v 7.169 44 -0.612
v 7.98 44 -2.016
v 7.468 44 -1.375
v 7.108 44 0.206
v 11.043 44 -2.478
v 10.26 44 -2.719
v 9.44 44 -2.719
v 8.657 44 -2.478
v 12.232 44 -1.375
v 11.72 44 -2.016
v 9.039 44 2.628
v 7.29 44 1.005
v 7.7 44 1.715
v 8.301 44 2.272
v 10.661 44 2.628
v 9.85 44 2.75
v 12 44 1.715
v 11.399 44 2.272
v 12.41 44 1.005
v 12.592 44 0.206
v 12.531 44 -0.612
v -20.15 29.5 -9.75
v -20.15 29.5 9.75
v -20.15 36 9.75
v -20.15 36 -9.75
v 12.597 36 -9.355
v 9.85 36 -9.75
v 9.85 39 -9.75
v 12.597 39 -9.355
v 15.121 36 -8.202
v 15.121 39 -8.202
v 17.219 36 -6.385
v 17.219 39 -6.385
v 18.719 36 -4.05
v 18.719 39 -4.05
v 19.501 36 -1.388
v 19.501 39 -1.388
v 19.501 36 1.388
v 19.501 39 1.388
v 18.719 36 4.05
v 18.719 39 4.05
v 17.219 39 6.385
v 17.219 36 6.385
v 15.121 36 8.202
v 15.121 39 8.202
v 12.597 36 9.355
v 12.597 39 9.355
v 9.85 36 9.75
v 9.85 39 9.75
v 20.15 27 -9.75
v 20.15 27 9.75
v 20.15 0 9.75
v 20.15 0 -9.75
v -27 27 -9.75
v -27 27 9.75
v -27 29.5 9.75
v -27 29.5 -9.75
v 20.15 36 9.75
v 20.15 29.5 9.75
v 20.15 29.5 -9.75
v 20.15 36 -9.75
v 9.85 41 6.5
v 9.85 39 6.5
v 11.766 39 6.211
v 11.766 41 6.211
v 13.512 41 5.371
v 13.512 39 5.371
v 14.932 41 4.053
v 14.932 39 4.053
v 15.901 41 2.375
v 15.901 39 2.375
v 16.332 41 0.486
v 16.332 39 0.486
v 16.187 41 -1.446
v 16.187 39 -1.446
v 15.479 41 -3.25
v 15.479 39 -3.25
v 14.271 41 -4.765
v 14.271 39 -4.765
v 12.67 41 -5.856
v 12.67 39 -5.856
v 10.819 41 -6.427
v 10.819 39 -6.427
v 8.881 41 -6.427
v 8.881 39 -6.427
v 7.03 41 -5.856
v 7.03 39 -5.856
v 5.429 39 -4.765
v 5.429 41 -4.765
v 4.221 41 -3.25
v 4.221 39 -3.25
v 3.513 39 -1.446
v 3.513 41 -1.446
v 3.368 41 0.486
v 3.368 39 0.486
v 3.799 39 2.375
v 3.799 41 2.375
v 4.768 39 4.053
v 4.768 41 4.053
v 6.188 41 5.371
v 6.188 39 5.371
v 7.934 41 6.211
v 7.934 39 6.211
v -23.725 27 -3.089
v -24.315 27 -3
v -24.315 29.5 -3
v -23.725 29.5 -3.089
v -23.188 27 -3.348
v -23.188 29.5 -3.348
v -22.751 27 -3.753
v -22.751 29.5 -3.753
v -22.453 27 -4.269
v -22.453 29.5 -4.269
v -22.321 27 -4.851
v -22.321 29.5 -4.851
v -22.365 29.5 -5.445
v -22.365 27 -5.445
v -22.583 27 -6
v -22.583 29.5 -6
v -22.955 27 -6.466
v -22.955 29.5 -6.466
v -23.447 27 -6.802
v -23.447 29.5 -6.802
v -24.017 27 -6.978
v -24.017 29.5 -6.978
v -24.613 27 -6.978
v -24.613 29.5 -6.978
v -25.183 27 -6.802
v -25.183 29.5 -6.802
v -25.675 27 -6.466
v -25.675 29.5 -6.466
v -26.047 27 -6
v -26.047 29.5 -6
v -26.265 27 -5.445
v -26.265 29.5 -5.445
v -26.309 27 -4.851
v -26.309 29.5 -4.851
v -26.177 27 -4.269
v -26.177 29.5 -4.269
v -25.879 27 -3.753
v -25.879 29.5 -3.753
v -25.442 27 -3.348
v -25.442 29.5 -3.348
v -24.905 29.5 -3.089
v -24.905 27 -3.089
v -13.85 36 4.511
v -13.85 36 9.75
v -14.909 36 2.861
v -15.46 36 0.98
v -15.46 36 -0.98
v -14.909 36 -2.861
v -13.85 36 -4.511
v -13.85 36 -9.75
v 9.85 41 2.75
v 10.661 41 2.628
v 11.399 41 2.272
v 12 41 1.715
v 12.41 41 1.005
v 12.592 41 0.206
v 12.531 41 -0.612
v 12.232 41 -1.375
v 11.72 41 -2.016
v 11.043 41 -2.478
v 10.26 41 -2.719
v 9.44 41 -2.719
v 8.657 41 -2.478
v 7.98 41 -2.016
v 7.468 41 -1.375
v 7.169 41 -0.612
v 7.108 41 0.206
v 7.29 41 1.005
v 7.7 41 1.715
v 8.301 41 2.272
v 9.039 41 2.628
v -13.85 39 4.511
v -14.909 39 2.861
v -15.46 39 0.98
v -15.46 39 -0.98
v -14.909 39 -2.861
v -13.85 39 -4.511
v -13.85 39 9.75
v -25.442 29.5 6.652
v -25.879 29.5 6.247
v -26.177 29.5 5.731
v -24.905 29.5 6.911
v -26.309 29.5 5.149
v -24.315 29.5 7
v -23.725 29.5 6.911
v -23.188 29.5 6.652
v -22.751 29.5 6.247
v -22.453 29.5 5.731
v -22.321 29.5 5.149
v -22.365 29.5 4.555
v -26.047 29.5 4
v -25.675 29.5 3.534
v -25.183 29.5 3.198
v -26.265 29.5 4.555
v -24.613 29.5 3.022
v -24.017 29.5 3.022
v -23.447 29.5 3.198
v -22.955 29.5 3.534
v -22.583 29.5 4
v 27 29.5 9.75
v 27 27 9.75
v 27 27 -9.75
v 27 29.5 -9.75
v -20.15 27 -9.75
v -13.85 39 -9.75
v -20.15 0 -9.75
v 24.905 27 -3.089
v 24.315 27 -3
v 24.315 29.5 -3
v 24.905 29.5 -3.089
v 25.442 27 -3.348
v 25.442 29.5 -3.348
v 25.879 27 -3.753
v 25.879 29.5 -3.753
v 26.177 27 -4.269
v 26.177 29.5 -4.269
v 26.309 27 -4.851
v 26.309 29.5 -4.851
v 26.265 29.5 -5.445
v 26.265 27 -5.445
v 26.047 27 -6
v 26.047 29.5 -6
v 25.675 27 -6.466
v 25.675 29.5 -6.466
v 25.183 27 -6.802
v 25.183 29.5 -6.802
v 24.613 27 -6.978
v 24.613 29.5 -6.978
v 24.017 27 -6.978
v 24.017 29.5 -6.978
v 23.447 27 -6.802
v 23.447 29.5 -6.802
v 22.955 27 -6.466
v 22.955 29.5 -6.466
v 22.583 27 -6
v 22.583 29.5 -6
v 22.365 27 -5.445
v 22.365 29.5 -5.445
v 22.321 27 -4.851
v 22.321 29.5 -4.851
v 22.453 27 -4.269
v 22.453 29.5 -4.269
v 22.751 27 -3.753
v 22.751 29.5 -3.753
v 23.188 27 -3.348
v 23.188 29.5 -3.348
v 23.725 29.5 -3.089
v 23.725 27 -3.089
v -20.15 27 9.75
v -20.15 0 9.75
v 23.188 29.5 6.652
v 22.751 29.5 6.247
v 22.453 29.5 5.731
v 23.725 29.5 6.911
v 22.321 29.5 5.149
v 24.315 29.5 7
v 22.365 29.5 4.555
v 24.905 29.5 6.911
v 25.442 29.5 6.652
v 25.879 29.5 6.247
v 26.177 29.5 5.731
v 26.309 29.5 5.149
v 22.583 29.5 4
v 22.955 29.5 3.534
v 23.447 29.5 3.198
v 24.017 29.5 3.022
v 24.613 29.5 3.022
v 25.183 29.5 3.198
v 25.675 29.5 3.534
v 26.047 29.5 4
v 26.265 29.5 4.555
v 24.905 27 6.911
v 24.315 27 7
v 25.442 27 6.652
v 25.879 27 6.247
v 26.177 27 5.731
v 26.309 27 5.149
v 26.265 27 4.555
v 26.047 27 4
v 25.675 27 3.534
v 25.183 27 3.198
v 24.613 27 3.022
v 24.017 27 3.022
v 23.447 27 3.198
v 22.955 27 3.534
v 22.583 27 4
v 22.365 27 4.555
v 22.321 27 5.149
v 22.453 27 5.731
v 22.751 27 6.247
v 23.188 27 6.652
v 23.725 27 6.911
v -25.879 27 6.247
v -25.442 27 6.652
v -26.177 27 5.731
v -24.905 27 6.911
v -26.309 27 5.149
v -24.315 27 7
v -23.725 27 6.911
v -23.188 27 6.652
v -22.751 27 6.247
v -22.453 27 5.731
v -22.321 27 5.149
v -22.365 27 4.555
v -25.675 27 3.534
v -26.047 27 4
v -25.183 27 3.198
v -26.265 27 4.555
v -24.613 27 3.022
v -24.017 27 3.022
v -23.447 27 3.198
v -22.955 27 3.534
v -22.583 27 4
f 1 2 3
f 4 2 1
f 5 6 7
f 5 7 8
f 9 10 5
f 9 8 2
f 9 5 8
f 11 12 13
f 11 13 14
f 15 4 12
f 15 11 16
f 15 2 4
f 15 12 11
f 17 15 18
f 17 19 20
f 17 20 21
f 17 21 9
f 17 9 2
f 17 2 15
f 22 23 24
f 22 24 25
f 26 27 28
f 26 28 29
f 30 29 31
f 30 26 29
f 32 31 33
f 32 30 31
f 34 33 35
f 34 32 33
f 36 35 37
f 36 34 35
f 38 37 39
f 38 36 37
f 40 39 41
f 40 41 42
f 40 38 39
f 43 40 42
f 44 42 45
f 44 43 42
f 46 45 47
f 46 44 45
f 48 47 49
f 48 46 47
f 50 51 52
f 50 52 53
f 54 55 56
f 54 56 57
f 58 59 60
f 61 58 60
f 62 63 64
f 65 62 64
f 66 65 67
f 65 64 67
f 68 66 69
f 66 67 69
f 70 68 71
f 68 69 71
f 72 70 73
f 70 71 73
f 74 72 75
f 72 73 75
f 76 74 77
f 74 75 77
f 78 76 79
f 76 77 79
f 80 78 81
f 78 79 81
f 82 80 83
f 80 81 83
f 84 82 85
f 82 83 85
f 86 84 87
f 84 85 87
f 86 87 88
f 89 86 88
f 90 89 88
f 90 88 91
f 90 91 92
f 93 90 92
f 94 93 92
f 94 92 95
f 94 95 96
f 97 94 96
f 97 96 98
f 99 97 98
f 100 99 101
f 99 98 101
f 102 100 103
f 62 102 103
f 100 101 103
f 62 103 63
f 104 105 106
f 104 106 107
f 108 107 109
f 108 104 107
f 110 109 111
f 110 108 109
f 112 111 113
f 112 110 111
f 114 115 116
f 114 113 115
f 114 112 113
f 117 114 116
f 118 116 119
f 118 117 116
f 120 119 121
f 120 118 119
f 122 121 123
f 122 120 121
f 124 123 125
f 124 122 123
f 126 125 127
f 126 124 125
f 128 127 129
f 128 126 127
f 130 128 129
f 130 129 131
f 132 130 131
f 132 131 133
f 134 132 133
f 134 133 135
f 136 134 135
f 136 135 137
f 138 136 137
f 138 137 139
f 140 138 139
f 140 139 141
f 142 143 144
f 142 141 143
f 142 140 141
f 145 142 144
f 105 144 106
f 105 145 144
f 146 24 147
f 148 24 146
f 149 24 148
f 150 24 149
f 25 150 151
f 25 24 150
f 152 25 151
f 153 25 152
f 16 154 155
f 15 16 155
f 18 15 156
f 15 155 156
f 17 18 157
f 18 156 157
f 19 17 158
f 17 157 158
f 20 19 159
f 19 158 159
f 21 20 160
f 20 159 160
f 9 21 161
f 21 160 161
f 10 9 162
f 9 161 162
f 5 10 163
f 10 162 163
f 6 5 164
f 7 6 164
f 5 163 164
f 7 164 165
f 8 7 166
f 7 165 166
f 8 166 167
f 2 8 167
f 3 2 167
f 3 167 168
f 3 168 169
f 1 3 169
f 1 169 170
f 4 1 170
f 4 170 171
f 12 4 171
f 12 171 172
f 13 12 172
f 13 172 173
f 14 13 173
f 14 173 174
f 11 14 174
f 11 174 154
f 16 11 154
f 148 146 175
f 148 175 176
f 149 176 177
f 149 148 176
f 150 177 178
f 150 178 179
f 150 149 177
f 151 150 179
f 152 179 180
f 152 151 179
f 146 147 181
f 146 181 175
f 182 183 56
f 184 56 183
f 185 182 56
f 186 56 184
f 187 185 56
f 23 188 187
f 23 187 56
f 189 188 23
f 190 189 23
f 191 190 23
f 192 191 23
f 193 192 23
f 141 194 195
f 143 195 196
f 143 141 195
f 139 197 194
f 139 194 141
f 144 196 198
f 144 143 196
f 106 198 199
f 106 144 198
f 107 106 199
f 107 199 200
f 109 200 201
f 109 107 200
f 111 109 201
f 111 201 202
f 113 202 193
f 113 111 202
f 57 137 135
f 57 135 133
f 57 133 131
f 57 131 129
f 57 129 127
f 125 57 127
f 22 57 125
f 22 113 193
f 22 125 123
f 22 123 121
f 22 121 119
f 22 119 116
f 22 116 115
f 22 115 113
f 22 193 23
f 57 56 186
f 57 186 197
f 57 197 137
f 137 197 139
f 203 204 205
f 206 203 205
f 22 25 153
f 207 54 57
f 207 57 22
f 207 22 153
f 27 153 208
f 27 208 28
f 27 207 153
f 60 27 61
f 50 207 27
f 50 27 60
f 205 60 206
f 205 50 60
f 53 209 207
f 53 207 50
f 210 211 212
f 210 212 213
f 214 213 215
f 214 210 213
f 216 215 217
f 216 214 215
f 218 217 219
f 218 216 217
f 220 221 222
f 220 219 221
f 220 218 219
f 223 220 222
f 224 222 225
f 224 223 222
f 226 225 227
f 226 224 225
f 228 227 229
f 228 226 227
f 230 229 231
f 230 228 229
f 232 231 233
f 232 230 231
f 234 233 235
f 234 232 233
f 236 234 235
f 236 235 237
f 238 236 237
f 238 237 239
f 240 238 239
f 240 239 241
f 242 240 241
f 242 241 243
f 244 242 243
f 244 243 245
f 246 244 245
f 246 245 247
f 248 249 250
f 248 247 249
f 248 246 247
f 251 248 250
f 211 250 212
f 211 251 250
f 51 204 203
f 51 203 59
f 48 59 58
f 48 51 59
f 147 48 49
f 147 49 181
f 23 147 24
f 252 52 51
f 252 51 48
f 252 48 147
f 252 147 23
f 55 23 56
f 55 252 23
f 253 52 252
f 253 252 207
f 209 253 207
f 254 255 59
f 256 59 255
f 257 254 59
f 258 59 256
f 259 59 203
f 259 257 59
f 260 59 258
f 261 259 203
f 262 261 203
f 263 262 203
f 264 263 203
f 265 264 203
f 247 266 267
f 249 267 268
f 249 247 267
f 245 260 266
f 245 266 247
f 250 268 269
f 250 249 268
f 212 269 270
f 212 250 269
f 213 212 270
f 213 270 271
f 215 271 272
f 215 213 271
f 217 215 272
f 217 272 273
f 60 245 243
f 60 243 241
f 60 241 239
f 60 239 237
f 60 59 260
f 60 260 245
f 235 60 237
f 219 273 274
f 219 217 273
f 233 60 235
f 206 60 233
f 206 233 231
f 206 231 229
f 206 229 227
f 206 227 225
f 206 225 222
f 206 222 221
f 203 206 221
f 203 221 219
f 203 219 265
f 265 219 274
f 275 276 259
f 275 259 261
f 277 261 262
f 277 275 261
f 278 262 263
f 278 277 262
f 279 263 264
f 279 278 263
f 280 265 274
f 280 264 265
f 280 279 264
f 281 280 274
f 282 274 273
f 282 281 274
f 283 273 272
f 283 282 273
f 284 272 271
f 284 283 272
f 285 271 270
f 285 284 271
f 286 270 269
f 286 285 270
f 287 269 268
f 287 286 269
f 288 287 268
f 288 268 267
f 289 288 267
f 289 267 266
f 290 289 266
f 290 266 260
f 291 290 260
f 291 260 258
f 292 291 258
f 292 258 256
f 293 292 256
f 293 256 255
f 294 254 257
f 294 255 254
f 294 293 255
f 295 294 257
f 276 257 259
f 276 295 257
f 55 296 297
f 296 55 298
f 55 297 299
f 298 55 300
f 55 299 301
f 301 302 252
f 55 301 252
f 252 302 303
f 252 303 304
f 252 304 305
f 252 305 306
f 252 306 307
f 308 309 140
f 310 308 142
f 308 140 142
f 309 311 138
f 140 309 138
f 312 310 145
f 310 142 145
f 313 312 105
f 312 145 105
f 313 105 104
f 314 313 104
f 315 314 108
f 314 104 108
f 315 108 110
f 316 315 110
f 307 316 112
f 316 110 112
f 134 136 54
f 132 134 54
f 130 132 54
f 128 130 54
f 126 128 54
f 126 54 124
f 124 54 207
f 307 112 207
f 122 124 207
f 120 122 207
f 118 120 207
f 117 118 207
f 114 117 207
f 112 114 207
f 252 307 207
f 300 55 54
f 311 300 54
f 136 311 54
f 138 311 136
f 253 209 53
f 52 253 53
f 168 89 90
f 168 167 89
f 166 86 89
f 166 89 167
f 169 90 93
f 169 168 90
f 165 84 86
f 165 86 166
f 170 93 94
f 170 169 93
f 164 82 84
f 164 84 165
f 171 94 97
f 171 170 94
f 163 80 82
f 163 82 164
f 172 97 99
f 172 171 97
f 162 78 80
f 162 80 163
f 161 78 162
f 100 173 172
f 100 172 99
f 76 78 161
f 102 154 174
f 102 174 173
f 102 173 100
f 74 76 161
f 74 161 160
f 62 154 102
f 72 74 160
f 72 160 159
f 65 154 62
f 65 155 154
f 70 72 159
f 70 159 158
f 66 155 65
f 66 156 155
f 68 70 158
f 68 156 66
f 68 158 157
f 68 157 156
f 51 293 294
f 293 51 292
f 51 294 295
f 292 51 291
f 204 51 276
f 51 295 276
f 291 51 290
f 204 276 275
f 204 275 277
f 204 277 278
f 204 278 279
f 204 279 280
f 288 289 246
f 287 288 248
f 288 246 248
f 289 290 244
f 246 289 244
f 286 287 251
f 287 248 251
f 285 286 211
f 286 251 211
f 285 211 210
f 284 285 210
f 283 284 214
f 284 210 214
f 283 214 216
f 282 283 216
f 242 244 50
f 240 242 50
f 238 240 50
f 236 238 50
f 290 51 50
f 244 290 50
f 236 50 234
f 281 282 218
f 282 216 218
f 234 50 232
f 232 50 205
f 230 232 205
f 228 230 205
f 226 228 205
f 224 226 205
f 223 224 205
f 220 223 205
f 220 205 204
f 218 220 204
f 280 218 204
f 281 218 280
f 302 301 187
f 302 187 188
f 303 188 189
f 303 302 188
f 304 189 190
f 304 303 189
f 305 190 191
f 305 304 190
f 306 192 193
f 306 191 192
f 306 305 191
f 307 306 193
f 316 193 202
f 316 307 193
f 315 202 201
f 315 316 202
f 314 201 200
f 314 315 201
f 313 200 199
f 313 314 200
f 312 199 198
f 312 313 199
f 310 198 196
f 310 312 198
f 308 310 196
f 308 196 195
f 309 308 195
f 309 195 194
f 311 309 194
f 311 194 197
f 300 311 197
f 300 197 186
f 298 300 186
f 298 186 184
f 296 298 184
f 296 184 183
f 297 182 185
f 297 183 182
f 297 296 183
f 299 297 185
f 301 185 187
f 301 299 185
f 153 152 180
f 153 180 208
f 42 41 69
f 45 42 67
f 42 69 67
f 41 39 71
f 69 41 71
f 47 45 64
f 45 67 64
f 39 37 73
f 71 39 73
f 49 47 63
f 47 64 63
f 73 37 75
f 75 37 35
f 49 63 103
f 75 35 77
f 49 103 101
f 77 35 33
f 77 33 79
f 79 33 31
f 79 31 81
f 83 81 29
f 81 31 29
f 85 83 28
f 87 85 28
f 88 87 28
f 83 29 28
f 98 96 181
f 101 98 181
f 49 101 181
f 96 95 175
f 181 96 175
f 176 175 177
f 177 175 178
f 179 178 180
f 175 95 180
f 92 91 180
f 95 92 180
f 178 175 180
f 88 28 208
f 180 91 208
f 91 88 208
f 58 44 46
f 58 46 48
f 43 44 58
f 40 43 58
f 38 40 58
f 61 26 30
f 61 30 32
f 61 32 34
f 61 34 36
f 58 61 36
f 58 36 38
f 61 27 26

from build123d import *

# Parameters (mm, degrees)
SKETCH1_W               = 40.3
SKETCH1_H               = 19.5
BOSS_EXTRUDE1_DEPTH     = 27
SKETCH2_W               = 54
SKETCH2_H               = 19.5
BOSS_EXTRUDE2_DEPTH     = 2.5
SKETCH3_W               = 40.3
SKETCH3_H               = 19.5
BOSS_EXTRUDE3_DEPTH     = 6.5
SKETCH4_R               = 2.75
BOSS_EXTRUDE4_DEPTH     = 8
CUT_EXTRUDE1_DEPTH      = 42.162027404
CUT_EXTRUDE1_DEPTH_BACK = 42.162027404
SKETCH5_R               = 2
BOSS_EXTRUDE5_DEPTH     = 3
SKETCH7_R               = 6.5
BOSS_EXTRUDE6_DEPTH     = 2
BOSS_EXTRUDE7_DEPTH     = 3


with BuildPart() as part:
    # Sketch1 → Boss-Extrude1 (new body)
    with BuildSketch(Plane(origin=(0, 0, 0), x_dir=(1, 0, 0), z_dir=(0, 1, 0))):
        Rectangle(SKETCH1_W, SKETCH1_H)
    extrude(amount=BOSS_EXTRUDE1_DEPTH)

    # Sketch2 → Boss-Extrude2 (add)
    with BuildSketch(Plane(origin=(0, 27, 0), x_dir=(1, 0, 0), z_dir=(0, 1, 0))):
        Rectangle(SKETCH2_W, SKETCH2_H)
    extrude(amount=BOSS_EXTRUDE2_DEPTH)

    # Sketch3 → Boss-Extrude3 (add)
    with BuildSketch(Plane(origin=(0, 29.5, 0), x_dir=(1, 0, 0), z_dir=(0, 1, 0))):
        Rectangle(SKETCH3_W, SKETCH3_H)
    extrude(amount=BOSS_EXTRUDE3_DEPTH)

    # Sketch4 → Boss-Extrude4 (add)
    with BuildSketch(Plane(origin=(0, 36, 0), x_dir=(1, 0, 0), z_dir=(0, 1, 0))):
        with Locations(Location((9.85, 0, 0), (0, 0, 270))):
            Circle(SKETCH4_R)
    extrude(amount=BOSS_EXTRUDE4_DEPTH)

    # Sketch5 → Cut-Extrude1 (cut, two sides: drawn at the far end of the back side and taken through both)
    with BuildSketch(Plane(origin=(0, 29.5, 0), x_dir=(1, 0, 0), z_dir=(0, 1, 0)).offset(-CUT_EXTRUDE1_DEPTH_BACK)):
        with Locations(Location((-24.315, 5, 0), (0, 0, 270))):
            Circle(SKETCH5_R)
        with Locations(Location((-24.315, -5, 0), (0, 0, 270))):
            Circle(SKETCH5_R)
        with Locations(Location((24.315, -5, 0), (0, 0, 270))):
            Circle(SKETCH5_R)
        with Locations(Location((24.315, 5, 0), (0, 0, 270))):
            Circle(SKETCH5_R)
    extrude(amount=CUT_EXTRUDE1_DEPTH + CUT_EXTRUDE1_DEPTH_BACK, mode=Mode.SUBTRACT)

    # Sketch6 → Boss-Extrude5 (add)
    with BuildSketch(Plane(origin=(0, 36, 0), x_dir=(1, 0, 0), z_dir=(0, 1, 0))):
        with BuildLine():
            Line((9.85, -9.75), (-13.85, -9.75))
            Line((-13.85, -9.75), (-13.85, 9.75))
            Line((-13.85, 9.75), (9.85, 9.75))
            ThreePointArc((9.85, 9.75), (19.6, 0), (9.85, -9.75))
        make_face()
    extrude(amount=BOSS_EXTRUDE5_DEPTH)

    # Sketch7 → Boss-Extrude6 (add)
    with BuildSketch(Plane(origin=(0, 39, 0), x_dir=(1, 0, 0), z_dir=(0, 1, 0))):
        with Locations(Location((9.85, 0, 0), (0, 0, 270))):
            Circle(SKETCH7_R)
    extrude(amount=BOSS_EXTRUDE6_DEPTH)

    # Sketch8 → Boss-Extrude7 (add)
    with BuildSketch(Plane(origin=(0, 36, 0), x_dir=(1, 0, 0), z_dir=(0, 1, 0))):
        with BuildLine():
            Line((-13.85, 4.510933332), (-13.85, -4.510933332))
            ThreePointArc((-13.85, -4.510933332), (-15.530301972, 0), (-13.85, 4.510933332))
        make_face()
    extrude(amount=BOSS_EXTRUDE7_DEPTH)


solid = part.part
